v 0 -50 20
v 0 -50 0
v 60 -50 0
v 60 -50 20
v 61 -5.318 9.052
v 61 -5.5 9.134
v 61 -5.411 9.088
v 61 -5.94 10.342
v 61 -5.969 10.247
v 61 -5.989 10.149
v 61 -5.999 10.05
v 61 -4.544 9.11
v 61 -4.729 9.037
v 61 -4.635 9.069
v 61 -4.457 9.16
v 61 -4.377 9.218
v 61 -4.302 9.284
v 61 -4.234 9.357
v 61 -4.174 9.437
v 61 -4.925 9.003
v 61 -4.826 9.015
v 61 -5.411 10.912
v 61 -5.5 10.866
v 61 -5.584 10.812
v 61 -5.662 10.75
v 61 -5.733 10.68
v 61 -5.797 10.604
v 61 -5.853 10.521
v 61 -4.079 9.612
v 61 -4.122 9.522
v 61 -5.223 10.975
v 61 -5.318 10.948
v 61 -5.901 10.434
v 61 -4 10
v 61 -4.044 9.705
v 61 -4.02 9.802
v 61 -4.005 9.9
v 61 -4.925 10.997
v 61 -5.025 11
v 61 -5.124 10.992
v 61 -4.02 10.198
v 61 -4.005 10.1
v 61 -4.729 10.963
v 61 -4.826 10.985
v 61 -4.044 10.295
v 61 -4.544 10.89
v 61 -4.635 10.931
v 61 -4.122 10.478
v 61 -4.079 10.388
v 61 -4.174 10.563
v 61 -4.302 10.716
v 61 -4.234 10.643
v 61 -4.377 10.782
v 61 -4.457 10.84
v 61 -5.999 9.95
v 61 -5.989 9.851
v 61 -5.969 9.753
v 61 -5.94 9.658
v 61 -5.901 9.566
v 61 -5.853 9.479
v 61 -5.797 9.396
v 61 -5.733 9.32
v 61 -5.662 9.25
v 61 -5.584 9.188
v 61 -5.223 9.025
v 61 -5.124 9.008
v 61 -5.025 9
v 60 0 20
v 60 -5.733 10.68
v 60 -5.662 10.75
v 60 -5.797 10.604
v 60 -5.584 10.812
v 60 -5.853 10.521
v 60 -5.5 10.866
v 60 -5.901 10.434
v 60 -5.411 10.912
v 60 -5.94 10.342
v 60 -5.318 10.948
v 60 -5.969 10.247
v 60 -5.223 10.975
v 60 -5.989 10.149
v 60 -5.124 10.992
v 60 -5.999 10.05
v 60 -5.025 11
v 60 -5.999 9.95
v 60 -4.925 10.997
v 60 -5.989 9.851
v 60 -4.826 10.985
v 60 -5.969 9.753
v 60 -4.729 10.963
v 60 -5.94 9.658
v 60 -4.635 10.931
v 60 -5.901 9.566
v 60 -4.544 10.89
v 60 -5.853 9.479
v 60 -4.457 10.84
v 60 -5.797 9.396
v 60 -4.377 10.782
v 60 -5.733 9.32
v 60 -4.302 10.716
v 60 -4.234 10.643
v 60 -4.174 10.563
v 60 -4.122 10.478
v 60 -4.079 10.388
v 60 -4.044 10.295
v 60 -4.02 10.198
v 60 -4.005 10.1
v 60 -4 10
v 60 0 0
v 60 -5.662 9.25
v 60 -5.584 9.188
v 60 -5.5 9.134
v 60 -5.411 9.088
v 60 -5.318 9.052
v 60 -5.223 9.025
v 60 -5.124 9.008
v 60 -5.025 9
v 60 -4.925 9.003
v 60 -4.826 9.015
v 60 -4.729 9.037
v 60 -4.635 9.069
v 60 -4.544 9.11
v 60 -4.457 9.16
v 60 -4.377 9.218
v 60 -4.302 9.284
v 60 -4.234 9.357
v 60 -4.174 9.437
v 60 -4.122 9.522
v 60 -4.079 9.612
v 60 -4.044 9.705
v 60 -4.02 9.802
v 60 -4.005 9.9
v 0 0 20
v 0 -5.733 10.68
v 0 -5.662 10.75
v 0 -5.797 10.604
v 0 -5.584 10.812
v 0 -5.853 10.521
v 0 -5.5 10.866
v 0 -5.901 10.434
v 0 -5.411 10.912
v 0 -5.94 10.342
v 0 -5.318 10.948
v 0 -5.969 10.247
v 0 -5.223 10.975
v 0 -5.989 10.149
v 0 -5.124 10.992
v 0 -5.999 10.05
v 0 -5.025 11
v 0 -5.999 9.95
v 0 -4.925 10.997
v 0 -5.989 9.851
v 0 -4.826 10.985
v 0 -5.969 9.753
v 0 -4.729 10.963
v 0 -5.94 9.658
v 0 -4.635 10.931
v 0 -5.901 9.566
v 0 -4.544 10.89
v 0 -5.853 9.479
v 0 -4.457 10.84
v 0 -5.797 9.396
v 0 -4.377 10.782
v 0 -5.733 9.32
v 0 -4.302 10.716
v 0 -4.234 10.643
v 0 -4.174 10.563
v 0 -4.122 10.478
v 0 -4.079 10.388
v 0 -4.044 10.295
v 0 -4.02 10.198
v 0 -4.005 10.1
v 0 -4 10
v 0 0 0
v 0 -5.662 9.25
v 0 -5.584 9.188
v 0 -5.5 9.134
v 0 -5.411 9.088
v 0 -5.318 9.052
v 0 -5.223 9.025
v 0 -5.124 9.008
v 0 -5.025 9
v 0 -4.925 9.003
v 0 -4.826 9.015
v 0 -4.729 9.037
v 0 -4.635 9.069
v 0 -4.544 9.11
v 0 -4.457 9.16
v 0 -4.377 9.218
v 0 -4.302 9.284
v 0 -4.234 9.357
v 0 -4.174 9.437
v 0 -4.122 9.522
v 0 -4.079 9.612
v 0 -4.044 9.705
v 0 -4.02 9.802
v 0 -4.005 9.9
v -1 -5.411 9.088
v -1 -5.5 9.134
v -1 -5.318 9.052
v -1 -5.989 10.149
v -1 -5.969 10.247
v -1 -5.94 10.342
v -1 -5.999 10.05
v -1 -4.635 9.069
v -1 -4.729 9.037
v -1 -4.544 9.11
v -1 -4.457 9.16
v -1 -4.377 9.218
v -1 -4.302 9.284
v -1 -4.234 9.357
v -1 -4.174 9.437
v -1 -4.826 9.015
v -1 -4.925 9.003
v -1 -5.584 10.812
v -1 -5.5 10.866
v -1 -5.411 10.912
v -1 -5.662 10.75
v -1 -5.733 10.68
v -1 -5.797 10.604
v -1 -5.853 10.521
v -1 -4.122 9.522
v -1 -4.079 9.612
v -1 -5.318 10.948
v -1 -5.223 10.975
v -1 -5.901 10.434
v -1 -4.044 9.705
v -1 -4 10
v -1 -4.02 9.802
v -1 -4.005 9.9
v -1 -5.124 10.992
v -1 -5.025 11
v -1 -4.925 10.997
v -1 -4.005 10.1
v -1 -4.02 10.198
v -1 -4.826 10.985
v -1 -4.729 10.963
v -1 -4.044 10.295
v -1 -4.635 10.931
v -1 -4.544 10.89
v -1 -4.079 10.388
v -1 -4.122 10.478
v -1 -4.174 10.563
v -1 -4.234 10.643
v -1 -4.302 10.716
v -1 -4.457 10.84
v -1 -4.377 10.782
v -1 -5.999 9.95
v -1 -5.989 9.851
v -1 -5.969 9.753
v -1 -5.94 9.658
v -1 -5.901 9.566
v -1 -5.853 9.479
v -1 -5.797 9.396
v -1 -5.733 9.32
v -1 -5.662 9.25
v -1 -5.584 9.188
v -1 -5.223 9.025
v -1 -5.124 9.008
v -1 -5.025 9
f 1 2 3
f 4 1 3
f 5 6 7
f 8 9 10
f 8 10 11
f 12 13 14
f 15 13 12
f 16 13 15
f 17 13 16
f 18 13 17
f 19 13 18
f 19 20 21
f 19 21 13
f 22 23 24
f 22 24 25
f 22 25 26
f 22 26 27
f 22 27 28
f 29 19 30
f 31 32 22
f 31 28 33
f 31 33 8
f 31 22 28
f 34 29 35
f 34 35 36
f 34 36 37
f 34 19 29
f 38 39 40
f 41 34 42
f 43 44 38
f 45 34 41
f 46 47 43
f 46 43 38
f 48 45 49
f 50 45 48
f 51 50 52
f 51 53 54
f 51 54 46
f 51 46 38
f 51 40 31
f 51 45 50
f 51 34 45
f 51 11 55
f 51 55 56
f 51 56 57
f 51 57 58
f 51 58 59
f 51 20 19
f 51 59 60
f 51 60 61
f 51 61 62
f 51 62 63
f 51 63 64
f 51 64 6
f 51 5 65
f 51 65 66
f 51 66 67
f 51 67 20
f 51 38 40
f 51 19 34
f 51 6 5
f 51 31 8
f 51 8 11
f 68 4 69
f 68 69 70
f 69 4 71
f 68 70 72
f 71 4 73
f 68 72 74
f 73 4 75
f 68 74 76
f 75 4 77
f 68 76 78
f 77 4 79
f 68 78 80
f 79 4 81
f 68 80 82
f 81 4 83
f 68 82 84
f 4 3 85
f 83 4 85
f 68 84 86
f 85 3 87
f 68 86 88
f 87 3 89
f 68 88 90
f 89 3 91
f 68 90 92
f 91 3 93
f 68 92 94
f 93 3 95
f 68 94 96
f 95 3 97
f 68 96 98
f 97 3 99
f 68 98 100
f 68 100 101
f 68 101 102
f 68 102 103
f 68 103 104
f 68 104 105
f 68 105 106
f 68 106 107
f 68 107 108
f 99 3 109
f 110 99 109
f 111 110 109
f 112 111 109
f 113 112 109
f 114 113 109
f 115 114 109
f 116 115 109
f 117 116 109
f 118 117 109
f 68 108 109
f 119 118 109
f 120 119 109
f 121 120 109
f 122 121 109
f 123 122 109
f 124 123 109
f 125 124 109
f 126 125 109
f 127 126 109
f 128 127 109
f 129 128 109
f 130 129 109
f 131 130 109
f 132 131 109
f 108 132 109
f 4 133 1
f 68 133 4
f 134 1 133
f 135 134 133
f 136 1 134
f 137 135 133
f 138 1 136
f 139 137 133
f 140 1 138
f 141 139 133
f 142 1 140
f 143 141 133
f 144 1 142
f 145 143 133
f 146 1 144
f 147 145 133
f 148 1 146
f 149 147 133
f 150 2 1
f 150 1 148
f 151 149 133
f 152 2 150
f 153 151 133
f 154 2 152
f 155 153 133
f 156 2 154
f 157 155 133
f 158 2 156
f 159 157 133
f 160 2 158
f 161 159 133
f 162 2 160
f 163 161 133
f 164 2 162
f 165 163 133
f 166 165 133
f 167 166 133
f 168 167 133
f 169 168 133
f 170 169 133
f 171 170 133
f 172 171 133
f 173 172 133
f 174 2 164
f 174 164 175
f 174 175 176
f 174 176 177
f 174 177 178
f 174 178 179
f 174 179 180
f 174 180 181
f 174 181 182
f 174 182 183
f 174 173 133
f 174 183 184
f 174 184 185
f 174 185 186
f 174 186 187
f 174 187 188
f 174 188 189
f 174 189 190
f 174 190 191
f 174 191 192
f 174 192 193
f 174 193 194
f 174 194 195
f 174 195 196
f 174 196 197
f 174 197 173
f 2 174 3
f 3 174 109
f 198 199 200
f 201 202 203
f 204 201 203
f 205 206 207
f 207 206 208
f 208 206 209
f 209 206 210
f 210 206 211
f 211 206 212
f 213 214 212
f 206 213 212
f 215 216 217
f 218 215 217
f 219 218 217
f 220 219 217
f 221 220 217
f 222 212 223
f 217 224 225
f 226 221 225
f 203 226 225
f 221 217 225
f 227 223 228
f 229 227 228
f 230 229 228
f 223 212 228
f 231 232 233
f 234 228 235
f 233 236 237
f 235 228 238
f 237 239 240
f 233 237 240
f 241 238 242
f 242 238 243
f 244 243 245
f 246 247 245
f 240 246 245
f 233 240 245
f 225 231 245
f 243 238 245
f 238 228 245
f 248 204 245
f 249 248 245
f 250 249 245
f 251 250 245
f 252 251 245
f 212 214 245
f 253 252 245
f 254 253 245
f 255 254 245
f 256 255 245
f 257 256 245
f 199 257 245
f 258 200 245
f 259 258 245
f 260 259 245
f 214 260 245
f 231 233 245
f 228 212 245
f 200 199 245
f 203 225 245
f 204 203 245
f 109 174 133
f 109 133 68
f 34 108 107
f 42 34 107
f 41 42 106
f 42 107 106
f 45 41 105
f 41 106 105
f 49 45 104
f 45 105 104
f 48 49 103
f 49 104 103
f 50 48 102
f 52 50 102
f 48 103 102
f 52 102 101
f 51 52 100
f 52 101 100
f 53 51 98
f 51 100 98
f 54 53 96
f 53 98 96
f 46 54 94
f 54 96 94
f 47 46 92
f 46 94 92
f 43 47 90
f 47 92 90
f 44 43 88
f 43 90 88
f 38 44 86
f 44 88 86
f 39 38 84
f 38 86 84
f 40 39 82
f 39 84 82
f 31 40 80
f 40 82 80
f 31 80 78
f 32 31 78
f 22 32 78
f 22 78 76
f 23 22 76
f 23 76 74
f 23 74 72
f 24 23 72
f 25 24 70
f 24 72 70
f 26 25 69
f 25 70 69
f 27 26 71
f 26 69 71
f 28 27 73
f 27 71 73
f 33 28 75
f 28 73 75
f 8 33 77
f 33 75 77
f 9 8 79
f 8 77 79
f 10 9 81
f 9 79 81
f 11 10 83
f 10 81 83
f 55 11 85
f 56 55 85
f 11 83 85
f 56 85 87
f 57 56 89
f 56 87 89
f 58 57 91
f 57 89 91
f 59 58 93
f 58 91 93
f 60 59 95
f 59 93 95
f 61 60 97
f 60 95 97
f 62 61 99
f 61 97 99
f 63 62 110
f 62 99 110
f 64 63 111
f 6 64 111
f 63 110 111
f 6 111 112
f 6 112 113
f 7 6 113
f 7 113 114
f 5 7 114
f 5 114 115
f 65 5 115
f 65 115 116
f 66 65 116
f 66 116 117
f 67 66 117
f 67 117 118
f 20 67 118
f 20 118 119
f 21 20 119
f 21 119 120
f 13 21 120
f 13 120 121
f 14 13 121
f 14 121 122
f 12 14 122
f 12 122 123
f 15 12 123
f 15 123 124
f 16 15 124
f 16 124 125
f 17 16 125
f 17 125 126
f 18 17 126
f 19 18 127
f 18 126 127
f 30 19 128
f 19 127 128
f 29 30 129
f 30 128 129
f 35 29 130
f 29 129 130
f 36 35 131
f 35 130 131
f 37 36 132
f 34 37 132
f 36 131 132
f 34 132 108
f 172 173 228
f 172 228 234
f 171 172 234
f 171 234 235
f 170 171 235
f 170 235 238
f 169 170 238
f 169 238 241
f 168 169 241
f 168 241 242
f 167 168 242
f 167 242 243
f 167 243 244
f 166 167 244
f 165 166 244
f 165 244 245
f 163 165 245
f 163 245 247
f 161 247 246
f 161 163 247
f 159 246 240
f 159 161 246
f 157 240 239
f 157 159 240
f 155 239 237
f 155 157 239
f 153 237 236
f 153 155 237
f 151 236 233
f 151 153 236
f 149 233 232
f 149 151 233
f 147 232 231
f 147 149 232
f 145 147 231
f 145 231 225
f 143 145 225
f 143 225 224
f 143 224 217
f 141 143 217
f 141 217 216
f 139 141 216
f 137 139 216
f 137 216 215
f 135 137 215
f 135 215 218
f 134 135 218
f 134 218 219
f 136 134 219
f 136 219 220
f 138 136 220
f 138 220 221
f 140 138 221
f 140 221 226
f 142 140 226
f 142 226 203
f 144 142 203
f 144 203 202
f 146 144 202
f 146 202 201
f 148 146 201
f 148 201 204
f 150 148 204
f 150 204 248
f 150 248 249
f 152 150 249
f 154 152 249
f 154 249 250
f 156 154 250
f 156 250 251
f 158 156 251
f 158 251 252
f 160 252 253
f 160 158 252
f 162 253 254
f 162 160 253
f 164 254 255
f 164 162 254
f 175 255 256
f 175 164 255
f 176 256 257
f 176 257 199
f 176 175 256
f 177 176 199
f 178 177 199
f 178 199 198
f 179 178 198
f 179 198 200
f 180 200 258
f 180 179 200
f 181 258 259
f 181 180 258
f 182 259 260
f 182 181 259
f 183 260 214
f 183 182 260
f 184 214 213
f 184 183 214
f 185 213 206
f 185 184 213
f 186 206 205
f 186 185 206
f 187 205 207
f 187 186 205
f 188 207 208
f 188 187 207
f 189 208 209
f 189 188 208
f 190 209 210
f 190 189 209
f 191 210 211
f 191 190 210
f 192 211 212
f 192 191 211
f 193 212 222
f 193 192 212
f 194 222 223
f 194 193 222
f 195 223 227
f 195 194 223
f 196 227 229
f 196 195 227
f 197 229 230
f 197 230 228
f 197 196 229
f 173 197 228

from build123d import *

# Parameters (mm, degrees)
F0_W      = 60
F0_H      = 50
F1_DEPTH  = 20
F2_R      = 1
F3_DEPTH  = 1
F3_FACE_R = 1
F4_DEPTH  = 62


with BuildPart() as f1:
    # F0 (on Top) → F1 (new body)
    with BuildSketch(Plane.XY):
        with Locations((30, -25)):
            Rectangle(F0_W, F0_H)
    extrude(amount=F1_DEPTH)

    # F2 (on face) → F3 (join)
    with BuildSketch(Plane.YZ.offset(60)):
        with Locations((-5, 10)):
            Circle(F2_R)
    extrude(amount=F3_DEPTH)

    # F3_face (on face) → F4 (join)
    with BuildSketch(Plane(origin=(61, -5, 10), x_dir=(0, 1, 0), z_dir=(1, 0, 0))):
        Circle(F3_FACE_R)
    extrude(amount=-F4_DEPTH)


solid = f1.part
